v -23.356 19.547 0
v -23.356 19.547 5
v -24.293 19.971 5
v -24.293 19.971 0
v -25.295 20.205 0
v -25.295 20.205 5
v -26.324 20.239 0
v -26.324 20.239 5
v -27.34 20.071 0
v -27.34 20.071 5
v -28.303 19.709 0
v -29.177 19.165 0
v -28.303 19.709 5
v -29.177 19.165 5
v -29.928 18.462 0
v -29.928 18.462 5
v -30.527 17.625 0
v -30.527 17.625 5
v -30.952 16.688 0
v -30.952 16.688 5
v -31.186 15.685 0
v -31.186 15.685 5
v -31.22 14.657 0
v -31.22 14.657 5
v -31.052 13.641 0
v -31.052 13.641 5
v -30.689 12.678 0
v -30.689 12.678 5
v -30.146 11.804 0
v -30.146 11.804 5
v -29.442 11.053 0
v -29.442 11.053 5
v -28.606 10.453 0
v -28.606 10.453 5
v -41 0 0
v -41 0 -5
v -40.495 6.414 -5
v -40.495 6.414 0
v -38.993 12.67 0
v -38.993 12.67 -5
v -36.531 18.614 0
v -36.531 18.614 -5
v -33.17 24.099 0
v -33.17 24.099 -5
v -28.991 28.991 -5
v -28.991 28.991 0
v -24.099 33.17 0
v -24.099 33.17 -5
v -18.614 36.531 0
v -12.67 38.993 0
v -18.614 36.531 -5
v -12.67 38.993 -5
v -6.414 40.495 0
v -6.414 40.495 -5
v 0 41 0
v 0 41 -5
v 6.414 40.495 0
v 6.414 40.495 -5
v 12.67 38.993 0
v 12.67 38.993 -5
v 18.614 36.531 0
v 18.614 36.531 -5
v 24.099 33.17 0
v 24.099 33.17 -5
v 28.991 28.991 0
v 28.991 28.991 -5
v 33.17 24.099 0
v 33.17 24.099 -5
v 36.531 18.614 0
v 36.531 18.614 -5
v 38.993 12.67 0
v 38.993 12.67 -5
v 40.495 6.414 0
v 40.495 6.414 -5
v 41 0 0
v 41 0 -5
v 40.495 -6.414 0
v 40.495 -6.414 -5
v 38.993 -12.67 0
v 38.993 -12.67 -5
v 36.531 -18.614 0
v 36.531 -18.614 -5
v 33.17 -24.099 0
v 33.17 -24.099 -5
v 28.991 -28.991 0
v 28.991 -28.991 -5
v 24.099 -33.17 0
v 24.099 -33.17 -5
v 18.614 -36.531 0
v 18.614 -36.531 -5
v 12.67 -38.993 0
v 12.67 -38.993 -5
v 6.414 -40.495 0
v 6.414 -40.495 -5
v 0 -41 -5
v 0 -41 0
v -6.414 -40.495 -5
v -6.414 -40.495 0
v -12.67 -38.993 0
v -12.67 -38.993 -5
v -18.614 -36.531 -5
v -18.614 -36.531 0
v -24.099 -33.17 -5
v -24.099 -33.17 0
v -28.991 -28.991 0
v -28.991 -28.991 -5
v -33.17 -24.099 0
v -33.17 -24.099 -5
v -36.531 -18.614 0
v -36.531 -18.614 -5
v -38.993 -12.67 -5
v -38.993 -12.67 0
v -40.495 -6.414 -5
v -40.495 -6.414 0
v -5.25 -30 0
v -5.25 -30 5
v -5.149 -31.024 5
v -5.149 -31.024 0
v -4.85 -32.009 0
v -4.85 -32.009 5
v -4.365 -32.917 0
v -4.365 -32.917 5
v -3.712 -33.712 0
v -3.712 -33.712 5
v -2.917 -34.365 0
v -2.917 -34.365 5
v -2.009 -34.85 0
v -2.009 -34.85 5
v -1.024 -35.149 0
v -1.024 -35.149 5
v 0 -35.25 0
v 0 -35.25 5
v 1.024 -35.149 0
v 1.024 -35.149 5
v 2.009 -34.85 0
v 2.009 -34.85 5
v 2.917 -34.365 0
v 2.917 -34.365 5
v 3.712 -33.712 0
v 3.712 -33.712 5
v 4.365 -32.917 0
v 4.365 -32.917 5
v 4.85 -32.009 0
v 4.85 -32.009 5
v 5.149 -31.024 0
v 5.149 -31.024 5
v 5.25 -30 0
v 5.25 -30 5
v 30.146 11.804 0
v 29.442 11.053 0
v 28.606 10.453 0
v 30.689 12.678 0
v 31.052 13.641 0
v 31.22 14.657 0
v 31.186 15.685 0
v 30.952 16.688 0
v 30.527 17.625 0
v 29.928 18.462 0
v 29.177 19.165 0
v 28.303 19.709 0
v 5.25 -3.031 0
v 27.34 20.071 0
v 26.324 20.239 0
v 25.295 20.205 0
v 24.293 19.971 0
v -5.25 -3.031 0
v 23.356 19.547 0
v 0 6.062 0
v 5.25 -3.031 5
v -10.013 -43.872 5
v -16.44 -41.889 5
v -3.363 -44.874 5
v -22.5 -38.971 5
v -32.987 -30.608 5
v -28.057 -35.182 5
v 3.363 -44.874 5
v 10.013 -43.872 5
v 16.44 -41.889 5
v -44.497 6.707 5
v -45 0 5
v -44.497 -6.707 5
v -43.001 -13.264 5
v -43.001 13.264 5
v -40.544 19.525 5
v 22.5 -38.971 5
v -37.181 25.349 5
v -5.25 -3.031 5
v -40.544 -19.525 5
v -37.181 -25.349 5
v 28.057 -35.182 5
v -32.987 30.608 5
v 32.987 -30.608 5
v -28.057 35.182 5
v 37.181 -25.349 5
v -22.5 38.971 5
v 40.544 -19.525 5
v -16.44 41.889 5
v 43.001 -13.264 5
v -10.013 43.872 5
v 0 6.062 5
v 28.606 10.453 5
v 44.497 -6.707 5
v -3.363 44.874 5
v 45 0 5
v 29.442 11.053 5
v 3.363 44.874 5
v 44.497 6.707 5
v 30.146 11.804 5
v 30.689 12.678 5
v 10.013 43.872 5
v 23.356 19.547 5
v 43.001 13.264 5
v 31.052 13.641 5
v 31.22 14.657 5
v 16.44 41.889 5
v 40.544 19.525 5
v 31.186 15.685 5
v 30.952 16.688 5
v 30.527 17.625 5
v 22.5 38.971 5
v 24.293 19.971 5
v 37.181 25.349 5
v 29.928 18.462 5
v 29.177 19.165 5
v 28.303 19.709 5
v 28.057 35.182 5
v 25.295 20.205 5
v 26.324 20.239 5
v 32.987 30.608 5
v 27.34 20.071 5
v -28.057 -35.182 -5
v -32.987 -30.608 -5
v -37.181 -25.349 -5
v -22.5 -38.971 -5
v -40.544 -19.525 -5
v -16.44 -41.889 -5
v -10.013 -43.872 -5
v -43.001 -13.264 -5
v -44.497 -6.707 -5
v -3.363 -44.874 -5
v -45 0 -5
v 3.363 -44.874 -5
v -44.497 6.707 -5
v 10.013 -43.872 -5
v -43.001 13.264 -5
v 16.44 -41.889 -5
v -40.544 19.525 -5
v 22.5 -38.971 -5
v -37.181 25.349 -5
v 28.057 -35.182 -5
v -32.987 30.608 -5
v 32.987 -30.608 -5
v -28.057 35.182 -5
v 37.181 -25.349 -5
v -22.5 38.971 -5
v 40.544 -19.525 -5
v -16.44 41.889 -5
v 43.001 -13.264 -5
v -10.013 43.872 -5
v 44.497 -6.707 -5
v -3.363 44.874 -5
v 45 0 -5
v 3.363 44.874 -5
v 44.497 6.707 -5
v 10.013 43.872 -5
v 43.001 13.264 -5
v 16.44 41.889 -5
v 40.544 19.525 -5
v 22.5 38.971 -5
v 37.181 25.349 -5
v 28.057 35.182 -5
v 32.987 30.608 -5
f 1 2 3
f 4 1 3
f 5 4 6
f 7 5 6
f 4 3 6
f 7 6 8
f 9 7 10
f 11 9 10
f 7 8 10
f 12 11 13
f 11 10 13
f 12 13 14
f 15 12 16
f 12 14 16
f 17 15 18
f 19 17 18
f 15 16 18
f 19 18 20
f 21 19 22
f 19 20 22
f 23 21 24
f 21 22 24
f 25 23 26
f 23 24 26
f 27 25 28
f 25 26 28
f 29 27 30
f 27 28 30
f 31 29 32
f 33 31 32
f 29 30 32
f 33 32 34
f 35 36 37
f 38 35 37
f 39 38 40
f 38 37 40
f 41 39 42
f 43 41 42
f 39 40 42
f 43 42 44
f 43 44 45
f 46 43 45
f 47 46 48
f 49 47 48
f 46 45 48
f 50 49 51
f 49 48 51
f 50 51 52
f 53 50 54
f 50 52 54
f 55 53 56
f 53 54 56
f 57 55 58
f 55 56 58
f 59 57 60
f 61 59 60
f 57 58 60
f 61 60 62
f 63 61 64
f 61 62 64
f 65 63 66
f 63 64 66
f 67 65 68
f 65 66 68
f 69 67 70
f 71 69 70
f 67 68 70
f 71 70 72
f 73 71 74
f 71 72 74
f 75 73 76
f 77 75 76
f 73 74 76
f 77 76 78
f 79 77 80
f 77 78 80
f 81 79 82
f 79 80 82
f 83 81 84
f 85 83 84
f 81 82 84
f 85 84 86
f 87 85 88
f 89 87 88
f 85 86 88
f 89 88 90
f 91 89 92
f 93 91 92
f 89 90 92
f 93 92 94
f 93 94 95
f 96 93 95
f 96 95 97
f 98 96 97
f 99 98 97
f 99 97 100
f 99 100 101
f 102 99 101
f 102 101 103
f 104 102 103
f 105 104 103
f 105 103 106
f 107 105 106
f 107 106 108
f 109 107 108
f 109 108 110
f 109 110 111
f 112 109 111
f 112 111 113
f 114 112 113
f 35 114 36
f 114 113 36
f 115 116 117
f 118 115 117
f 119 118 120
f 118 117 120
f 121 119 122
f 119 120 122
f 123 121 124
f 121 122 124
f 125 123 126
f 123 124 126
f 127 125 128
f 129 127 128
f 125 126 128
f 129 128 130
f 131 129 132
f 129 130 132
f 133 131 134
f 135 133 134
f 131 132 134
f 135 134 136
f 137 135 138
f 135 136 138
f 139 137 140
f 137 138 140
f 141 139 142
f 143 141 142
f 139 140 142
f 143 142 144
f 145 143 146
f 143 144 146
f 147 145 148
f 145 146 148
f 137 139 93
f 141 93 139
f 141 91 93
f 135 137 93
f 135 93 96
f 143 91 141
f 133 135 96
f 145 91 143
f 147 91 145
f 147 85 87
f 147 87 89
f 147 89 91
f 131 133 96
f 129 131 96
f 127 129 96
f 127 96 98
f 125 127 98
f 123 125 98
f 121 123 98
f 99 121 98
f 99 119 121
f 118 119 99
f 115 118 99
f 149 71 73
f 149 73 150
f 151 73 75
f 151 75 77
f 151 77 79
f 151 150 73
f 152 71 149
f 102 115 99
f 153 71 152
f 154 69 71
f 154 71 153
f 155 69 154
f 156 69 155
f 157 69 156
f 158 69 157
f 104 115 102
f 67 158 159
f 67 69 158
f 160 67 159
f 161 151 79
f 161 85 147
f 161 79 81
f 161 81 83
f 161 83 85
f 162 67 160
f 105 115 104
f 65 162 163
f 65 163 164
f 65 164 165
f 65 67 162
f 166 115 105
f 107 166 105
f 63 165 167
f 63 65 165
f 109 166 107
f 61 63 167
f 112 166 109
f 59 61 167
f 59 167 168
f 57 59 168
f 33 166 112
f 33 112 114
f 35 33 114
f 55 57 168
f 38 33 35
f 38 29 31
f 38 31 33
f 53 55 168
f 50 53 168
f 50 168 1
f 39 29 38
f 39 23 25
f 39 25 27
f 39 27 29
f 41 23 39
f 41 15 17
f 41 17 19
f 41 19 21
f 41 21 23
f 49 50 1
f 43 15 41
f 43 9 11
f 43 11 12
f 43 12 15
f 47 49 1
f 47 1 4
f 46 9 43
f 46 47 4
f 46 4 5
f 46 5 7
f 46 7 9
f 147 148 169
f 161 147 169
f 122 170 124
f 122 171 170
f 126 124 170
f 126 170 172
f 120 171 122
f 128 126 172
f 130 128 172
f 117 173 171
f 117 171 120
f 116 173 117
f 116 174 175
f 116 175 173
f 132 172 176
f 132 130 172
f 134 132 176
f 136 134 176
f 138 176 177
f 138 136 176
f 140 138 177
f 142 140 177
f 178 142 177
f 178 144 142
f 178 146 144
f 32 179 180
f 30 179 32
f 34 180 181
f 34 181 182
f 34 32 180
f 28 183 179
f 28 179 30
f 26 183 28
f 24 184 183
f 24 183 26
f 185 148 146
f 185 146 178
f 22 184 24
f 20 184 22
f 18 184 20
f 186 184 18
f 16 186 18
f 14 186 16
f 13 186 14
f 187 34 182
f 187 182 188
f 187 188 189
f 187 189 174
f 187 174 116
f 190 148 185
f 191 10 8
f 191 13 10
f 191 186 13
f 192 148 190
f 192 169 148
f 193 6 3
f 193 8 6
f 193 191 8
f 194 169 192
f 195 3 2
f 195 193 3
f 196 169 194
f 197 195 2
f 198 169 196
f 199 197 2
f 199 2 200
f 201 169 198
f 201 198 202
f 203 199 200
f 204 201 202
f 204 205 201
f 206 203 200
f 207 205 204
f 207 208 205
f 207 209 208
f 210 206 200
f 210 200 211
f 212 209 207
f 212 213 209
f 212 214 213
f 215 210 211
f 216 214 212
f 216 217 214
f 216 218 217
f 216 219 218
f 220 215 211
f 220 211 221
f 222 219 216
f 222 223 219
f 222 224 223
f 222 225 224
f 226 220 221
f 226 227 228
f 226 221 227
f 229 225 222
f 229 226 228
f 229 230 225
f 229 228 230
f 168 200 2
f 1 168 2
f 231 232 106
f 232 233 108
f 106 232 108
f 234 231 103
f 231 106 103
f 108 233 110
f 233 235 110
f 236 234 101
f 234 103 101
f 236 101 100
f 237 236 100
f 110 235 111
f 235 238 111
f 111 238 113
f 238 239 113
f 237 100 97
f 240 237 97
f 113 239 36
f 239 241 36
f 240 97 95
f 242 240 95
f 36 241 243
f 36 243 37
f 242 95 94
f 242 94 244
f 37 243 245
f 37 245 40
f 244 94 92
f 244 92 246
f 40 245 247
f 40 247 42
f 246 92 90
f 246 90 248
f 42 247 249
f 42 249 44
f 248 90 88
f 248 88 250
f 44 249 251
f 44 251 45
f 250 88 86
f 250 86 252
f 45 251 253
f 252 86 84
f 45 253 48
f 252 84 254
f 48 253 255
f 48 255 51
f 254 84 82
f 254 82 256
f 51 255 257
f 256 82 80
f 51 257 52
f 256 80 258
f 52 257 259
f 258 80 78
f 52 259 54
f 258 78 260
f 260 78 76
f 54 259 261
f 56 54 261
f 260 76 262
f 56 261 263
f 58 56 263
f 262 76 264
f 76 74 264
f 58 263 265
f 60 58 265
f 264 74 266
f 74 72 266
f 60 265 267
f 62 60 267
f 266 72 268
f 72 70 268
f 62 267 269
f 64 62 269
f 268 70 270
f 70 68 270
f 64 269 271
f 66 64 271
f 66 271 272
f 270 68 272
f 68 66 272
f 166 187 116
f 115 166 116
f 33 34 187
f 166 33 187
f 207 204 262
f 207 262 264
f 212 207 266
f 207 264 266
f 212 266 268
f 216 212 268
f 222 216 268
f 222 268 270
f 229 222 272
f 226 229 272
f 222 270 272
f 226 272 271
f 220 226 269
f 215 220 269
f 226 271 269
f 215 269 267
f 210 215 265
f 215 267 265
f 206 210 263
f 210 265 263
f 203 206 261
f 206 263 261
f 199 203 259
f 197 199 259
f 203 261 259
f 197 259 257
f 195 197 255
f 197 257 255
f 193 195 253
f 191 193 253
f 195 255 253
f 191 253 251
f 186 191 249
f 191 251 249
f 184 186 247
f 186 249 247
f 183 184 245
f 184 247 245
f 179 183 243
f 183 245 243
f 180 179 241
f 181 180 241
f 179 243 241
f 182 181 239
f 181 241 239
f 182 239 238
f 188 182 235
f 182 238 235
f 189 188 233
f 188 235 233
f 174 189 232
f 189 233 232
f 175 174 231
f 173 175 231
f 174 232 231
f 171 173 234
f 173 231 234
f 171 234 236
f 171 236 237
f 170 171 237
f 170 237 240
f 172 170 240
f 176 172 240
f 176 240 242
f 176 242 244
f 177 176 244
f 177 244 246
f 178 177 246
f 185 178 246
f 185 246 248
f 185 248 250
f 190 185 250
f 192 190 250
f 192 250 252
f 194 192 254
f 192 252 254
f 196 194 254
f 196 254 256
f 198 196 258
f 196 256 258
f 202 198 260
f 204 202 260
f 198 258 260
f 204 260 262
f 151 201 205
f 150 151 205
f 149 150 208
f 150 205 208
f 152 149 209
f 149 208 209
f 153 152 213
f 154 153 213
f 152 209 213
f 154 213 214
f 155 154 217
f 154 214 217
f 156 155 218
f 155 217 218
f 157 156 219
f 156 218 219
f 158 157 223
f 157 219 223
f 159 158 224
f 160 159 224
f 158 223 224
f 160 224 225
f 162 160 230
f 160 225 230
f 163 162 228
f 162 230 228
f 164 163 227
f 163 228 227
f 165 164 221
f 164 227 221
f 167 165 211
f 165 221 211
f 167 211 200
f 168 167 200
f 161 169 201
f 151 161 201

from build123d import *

# Parameters (mm, degrees)
CROQUIS1_R              = 40
DISCO_DEPTH             = 5
CORTAR_EXTRUIR1_DEPTH   = 10
SALIENTE_EXTRUIR5_START = -10
CROQUIS7_R              = 45
CROQUIS7_R_2            = 40
SALIENTE_EXTRUIR5_DEPTH = 10
CROQUIS8_R              = 41
CORTAR_EXTRUIR2_DEPTH   = 5


with BuildPart() as part:
    # Croquis1 → Disco (new body)
    with BuildSketch(Plane.XY):
        Circle(CROQUIS1_R)
    extrude(amount=DISCO_DEPTH)

    # Croquis6 → Cortar-Extruir1 (cut)
    with BuildSketch(Plane.XY.offset(5)):
        with BuildLine():
            Line((-5.25, 0), (-5.25, -30))
            ThreePointArc((-5.25, -30), (0, -35.25), (5.25, -30))
            Line((5.25, -30), (5.25, 0))
            ThreePointArc((5.25, 0), (0, 5.25), (-5.25, 0))
        make_face()
        with BuildLine():
            Line((2.625, 4.54663337), (-23.355762114, 19.54663337))
            ThreePointArc((-23.355762114, 19.54663337), (-30.527395483, 17.625), (-28.605762114, 10.45336663))
            Line((-28.605762114, 10.45336663), (-2.625, -4.54663337))
            ThreePointArc((-2.625, -4.54663337), (4.54663337, -2.625), (2.625, 4.54663337))
        make_face()
        with BuildLine():
            Line((2.625, -4.54663337), (28.605762114, 10.45336663))
            ThreePointArc((28.605762114, 10.45336663), (30.527395483, 17.625), (23.355762114, 19.54663337))
            Line((23.355762114, 19.54663337), (-2.625, 4.54663337))
            ThreePointArc((-2.625, 4.54663337), (-4.54663337, -2.625), (2.625, -4.54663337))
        make_face()
    extrude(amount=-CORTAR_EXTRUIR1_DEPTH, mode=Mode.SUBTRACT)

    # Croquis7 → Saliente-Extruir5 (add)
    with BuildSketch(Plane.XY.offset(5).offset(SALIENTE_EXTRUIR5_START)):
        Circle(CROQUIS7_R)
        Circle(CROQUIS7_R_2, mode=Mode.SUBTRACT)
    extrude(amount=SALIENTE_EXTRUIR5_DEPTH)

    # Croquis8 → Cortar-Extruir2 (cut)
    with BuildSketch(Plane(origin=(0, 0, -5), x_dir=(-1, 0, 0), z_dir=(0, 0, -1))):
        Circle(CROQUIS8_R)
    extrude(amount=-CORTAR_EXTRUIR2_DEPTH, mode=Mode.SUBTRACT)


solid = part.part
